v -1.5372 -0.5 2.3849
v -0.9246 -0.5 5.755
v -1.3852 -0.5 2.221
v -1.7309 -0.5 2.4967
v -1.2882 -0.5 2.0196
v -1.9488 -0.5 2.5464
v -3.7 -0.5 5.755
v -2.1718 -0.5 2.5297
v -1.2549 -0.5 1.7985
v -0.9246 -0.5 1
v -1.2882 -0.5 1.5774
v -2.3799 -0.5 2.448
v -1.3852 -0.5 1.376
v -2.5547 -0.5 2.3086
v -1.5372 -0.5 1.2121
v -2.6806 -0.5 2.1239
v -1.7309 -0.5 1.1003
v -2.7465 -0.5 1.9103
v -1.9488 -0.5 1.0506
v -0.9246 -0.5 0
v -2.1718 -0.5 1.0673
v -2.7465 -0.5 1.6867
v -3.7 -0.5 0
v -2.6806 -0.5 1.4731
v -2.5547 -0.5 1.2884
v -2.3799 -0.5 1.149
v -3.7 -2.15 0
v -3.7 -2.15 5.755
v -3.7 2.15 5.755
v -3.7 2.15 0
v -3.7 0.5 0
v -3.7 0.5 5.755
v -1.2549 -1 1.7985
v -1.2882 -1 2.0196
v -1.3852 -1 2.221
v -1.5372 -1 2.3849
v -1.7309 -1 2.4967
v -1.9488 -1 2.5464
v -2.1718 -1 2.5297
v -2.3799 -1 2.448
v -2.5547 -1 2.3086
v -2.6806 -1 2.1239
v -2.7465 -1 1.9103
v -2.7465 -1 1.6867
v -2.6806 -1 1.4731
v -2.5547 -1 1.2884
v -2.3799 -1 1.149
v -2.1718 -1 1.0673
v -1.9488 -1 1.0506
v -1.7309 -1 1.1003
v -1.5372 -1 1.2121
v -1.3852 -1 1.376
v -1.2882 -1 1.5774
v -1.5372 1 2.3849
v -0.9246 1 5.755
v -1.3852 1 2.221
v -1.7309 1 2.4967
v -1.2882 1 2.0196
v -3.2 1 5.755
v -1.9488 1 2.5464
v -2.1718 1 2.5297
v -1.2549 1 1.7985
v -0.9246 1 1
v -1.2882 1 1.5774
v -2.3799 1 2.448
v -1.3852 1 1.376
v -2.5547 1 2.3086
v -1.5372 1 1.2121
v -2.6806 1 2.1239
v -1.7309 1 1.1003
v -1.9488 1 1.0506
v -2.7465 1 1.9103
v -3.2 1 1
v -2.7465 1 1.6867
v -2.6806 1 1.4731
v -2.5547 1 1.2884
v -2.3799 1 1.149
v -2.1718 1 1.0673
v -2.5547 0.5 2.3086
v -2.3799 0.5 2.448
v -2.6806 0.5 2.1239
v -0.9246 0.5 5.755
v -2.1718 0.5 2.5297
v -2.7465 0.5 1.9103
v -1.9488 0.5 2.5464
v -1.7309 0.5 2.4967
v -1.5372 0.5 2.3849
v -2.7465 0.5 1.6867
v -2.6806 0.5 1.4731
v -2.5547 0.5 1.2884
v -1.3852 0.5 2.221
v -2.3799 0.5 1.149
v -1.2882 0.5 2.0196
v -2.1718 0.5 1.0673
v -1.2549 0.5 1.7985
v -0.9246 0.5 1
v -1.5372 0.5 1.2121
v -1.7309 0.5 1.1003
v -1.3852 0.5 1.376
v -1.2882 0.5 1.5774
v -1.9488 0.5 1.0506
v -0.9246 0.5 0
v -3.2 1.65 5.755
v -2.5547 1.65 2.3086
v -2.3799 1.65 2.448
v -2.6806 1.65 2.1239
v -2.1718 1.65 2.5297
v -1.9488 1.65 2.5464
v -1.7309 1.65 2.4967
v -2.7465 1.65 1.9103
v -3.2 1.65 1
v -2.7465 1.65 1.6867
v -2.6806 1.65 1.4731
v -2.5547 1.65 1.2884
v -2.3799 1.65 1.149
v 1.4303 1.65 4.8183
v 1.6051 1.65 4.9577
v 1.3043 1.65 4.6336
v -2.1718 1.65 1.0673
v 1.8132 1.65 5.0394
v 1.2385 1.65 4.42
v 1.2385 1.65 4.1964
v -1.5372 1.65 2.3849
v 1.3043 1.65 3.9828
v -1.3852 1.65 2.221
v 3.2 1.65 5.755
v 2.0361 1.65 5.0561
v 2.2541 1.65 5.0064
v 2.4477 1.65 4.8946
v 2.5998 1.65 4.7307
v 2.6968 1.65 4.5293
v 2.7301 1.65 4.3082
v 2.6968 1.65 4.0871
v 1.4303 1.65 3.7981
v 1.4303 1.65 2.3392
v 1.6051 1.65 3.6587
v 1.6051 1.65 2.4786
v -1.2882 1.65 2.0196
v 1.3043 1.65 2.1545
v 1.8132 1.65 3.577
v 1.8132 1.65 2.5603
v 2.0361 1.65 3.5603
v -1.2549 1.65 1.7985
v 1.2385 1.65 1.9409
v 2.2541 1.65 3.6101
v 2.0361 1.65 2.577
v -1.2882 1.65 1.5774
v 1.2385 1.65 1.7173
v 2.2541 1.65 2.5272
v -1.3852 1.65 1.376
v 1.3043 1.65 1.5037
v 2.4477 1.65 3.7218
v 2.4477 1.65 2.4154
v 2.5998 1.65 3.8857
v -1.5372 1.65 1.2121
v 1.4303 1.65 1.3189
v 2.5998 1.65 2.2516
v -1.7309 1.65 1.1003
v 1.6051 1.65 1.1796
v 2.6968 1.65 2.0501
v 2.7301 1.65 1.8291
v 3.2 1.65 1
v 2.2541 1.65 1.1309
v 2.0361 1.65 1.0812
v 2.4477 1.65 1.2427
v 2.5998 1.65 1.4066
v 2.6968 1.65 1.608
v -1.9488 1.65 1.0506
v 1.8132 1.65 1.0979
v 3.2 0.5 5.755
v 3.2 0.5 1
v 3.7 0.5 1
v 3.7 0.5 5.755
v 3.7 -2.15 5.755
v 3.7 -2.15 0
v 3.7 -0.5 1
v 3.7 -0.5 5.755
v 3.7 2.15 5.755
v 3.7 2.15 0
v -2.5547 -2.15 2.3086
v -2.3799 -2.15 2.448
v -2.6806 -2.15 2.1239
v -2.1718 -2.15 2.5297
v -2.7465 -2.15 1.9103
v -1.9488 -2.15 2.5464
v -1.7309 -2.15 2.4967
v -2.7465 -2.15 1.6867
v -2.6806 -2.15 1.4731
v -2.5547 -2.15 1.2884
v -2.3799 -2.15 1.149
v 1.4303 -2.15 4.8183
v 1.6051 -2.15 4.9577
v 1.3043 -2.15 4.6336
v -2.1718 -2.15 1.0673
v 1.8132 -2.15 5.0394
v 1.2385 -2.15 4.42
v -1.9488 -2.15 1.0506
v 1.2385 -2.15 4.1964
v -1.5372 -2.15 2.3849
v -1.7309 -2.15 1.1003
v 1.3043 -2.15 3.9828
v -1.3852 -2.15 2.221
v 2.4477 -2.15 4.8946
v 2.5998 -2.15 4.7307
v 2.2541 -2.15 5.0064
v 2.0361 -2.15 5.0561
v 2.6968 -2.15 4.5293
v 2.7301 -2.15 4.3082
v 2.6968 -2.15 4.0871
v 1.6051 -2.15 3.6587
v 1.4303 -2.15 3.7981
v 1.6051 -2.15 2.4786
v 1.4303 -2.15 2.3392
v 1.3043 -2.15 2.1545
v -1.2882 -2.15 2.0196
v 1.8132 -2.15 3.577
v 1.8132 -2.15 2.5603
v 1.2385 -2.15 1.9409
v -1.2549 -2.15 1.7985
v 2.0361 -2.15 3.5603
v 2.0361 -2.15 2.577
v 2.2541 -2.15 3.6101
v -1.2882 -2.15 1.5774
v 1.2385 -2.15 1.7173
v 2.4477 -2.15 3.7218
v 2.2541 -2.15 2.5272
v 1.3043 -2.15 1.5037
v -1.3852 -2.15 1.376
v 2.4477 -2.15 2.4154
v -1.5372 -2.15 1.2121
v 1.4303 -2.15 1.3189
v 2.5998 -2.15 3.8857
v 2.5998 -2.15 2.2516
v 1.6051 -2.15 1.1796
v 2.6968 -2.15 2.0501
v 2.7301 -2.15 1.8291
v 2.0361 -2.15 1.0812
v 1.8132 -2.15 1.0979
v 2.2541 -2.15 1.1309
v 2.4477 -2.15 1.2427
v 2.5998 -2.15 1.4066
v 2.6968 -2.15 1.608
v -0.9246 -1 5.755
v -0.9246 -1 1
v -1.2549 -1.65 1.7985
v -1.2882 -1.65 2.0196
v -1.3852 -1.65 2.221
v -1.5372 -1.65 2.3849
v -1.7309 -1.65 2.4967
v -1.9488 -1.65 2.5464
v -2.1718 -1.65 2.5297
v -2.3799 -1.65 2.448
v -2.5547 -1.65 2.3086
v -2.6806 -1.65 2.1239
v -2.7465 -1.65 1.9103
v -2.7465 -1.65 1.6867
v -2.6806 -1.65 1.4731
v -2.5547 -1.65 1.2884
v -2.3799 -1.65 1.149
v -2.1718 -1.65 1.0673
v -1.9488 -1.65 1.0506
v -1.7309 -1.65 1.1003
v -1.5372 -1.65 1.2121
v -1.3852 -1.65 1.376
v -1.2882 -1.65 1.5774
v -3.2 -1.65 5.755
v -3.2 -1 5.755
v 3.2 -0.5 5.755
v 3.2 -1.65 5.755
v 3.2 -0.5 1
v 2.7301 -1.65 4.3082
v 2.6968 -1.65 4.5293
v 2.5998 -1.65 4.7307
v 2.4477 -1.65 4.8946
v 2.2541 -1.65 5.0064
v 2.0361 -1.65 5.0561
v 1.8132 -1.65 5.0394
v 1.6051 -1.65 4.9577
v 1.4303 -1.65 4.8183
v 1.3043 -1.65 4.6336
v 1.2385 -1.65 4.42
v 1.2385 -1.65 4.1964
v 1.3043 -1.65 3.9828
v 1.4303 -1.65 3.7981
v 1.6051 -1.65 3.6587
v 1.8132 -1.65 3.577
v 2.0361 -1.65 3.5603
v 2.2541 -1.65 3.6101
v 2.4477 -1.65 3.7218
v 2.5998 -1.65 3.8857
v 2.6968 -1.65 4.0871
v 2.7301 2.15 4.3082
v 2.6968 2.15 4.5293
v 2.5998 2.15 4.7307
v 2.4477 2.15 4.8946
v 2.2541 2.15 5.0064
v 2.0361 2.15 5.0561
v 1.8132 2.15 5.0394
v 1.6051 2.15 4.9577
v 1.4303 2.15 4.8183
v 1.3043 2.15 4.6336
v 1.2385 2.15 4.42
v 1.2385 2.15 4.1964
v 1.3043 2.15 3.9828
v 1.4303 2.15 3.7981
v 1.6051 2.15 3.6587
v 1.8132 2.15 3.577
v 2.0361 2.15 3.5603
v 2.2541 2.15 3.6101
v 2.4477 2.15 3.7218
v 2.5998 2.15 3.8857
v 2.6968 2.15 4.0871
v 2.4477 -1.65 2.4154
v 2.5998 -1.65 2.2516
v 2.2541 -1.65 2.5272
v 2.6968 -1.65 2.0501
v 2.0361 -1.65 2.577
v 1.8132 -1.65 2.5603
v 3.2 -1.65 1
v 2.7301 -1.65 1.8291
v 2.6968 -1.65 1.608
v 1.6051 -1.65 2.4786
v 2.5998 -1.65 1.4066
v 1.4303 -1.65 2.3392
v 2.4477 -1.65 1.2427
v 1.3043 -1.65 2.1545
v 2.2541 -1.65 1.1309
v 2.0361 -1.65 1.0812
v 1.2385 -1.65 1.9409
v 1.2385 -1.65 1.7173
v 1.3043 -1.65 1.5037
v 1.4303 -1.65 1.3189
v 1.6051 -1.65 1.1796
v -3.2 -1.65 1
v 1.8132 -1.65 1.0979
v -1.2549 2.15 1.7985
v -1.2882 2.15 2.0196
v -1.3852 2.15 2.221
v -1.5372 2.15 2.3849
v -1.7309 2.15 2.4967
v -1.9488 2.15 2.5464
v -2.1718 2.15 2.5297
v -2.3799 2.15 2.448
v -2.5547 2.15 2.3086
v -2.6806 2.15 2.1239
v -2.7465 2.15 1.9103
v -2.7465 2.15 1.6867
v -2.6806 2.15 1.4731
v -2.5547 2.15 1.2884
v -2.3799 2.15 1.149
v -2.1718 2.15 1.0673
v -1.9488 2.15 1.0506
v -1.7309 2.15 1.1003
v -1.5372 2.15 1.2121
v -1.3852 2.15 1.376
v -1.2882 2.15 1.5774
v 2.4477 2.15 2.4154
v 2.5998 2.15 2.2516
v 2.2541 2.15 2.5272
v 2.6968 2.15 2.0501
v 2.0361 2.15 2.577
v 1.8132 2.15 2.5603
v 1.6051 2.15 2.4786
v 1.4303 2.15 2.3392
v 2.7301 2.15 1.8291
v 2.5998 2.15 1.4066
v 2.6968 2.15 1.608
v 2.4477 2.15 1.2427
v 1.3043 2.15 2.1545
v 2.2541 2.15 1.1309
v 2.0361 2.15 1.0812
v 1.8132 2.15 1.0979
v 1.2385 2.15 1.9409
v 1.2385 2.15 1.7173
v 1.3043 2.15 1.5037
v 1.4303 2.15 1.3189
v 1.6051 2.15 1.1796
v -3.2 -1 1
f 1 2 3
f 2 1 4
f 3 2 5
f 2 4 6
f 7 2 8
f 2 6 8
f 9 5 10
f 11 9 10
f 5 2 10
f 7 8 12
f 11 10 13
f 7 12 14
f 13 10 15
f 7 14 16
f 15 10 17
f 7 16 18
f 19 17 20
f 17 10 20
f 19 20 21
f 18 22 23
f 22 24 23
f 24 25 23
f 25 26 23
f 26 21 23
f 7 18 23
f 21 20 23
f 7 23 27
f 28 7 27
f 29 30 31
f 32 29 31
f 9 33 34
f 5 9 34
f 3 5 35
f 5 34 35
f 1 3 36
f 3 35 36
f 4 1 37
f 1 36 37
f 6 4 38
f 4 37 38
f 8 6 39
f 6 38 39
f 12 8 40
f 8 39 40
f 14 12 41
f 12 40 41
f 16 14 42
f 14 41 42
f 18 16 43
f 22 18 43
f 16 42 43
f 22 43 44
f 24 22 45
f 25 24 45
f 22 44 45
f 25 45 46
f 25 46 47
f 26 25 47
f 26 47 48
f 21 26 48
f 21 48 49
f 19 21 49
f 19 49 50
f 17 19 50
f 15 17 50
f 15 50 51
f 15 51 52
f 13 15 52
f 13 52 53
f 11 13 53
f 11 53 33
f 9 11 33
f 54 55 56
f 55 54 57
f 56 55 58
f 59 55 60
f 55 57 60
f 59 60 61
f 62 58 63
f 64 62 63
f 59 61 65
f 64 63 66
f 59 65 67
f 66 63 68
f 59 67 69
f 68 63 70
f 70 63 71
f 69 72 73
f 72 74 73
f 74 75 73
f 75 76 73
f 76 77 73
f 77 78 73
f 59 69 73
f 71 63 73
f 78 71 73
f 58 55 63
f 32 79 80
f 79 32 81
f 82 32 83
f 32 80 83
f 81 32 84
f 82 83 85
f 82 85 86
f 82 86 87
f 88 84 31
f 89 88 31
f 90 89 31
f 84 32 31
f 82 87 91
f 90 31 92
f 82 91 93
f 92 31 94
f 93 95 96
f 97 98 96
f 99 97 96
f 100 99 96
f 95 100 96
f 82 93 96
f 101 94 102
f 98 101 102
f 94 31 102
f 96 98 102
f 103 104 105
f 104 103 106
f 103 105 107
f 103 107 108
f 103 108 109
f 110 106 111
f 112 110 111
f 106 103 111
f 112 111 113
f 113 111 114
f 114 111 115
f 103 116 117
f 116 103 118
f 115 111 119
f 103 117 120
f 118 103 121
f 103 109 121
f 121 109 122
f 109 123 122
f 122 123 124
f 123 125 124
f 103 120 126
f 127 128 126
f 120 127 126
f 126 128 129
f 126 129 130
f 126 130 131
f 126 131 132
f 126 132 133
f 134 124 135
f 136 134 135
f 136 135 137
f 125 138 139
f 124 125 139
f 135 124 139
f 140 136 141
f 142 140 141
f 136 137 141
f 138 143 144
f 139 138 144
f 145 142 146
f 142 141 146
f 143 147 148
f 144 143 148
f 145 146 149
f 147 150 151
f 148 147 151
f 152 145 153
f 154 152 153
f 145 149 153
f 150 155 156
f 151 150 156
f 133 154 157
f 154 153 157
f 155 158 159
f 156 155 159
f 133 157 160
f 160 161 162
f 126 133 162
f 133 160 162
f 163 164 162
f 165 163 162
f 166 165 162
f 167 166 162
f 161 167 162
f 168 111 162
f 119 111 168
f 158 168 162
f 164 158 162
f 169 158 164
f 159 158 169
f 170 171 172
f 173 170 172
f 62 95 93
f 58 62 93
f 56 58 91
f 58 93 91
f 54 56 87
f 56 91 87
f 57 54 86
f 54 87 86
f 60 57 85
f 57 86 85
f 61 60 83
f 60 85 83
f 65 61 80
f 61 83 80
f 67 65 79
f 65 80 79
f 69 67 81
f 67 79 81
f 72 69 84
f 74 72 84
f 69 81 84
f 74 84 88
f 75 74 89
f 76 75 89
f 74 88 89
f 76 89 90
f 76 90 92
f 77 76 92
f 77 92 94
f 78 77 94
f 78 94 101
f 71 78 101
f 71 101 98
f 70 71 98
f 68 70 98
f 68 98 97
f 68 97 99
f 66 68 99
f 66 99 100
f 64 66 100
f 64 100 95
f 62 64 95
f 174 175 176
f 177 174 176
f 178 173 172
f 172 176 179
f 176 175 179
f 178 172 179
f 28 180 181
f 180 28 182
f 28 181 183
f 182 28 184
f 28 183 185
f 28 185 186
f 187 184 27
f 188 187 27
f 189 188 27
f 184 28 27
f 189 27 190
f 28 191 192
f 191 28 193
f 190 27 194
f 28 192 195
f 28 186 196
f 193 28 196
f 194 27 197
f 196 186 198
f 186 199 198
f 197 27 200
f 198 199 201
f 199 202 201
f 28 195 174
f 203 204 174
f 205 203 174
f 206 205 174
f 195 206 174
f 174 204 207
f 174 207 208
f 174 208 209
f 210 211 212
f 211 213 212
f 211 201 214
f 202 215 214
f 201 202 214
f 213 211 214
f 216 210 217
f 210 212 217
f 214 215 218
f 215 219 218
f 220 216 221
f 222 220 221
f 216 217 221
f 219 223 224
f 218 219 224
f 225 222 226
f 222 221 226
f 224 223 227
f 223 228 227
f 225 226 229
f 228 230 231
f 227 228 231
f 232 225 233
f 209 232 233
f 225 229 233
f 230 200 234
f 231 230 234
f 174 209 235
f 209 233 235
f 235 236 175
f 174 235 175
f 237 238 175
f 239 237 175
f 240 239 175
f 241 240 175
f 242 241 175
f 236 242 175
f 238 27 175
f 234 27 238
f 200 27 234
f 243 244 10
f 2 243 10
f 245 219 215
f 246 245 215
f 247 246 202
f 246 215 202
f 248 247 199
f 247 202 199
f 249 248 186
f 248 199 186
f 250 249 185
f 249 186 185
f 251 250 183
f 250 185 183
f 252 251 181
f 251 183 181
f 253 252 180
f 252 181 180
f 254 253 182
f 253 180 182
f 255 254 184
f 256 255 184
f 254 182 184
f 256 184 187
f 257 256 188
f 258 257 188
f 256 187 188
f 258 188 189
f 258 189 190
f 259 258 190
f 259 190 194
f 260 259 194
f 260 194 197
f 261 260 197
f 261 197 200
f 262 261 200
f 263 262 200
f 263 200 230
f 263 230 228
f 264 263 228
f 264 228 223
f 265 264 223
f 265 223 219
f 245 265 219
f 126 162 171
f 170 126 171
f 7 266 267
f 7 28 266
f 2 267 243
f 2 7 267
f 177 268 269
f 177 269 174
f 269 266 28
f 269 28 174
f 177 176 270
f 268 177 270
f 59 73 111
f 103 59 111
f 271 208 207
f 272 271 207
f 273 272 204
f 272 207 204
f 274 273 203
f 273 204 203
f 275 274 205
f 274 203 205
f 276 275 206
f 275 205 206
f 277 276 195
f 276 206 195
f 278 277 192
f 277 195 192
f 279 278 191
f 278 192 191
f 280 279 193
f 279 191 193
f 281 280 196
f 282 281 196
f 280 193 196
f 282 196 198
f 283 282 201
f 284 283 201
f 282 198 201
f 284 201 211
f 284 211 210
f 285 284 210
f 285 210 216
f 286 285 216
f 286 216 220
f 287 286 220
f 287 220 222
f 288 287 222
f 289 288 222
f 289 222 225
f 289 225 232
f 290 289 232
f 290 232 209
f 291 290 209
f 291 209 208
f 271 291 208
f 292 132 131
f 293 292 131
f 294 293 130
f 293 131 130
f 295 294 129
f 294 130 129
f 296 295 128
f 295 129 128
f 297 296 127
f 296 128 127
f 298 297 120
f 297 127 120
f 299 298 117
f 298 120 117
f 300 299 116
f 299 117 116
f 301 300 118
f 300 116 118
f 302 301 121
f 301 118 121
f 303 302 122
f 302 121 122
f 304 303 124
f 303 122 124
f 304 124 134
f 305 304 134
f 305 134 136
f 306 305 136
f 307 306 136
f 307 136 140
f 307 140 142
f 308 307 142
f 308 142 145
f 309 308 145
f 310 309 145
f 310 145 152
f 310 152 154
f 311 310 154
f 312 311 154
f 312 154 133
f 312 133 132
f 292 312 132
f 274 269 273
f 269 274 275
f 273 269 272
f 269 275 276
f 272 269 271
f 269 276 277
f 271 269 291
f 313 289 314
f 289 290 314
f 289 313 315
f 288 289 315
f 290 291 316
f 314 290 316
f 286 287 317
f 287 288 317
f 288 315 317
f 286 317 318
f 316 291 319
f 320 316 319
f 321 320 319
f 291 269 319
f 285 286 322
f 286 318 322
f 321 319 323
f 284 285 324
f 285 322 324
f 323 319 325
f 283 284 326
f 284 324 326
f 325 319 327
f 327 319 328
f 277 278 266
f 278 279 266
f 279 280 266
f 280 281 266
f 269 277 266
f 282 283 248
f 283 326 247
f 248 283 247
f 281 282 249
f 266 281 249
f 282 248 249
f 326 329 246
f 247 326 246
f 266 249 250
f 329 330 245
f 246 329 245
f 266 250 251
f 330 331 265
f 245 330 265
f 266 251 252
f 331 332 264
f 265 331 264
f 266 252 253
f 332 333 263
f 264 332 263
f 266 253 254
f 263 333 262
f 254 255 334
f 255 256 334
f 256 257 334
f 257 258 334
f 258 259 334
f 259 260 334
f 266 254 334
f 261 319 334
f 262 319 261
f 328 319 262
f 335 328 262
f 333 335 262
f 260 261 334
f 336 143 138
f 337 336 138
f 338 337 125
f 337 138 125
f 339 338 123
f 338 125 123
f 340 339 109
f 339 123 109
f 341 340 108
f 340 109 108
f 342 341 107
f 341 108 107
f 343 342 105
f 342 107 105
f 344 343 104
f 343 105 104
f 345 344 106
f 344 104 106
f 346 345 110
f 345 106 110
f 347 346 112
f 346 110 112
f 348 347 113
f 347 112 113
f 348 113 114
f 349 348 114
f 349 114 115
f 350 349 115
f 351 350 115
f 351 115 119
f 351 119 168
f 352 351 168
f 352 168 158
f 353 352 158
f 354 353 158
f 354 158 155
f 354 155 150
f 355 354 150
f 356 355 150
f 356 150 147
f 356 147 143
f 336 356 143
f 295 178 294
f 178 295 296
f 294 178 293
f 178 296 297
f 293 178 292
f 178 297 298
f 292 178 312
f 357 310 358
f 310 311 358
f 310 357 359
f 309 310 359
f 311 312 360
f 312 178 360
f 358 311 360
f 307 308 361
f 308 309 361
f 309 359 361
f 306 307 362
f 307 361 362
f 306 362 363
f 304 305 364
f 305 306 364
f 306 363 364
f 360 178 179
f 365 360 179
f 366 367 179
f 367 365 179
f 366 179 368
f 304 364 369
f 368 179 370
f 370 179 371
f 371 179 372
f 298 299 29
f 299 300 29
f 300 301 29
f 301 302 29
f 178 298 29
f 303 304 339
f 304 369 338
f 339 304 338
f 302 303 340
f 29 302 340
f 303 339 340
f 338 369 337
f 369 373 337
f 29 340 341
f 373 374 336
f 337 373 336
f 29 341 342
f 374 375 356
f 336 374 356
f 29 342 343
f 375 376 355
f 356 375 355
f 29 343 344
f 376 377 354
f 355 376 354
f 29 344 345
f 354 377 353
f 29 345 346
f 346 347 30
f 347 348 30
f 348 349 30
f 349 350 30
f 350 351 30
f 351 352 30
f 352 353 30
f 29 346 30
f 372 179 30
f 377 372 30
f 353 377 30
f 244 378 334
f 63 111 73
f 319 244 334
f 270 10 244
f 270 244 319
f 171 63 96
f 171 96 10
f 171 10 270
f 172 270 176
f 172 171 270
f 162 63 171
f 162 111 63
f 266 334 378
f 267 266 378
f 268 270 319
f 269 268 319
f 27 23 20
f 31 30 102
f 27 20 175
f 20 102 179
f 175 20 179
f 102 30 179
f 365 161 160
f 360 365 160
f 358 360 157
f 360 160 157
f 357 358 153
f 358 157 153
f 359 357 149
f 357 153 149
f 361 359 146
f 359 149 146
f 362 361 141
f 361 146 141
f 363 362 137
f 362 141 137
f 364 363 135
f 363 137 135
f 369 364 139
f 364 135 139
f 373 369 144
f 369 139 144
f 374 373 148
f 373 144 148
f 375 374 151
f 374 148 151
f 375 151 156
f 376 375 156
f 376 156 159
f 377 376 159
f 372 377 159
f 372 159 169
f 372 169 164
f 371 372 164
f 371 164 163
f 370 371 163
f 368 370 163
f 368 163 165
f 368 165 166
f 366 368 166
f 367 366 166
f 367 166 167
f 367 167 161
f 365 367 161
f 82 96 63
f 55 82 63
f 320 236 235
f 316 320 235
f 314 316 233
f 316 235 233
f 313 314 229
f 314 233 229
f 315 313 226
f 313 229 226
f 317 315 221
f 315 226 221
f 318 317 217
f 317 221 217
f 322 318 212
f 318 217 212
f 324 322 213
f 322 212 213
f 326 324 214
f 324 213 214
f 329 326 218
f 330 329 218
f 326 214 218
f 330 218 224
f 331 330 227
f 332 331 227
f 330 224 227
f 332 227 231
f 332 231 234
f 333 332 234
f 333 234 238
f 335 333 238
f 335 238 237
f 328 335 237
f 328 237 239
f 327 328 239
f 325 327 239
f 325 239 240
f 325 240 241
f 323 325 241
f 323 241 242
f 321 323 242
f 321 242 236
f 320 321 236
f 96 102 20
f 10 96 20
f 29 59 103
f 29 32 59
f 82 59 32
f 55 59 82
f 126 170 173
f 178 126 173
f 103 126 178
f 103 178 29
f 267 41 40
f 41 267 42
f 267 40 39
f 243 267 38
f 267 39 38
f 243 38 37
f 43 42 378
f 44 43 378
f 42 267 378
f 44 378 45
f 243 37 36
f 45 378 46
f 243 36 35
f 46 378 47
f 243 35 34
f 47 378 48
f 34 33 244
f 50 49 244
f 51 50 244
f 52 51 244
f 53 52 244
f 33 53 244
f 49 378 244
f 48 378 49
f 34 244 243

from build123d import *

# Parameters (mm, degrees)
F1_DEPTH = 5.755
F2_R     = 0.75
F3_DEPTH = 25
F4_DEPTH = 1


with BuildPart() as f1:
    # F0 (on Top) → F1 (new body)
    with BuildSketch(Plane.XY):
        Polygon((-3.7, -2.15), (3.7, -2.15), (3.7, -0.5), (3.2, -0.5), (3.2, -1.65), (-3.2, -1.65), (-3.2, -1), (-0.924631, -1), (-0.924631, -0.5), (-3.7, -0.5), align=None)
        Polygon((3.2, 0.5), (3.7, 0.5), (3.7, 2.15), (-3.7, 2.15), (-3.7, 0.5), (-0.924631, 0.5), (-0.924631, 1), (-3.2, 1), (-3.2, 1.65), (3.2, 1.65), align=None)
    extrude(amount=F1_DEPTH)

    # F2 (on face) → F3 (cut)
    with BuildSketch(Plane.XZ.offset(2.15)):
        with Locations((1.980075, 4.308214)):
            Circle(F2_R)
        with Locations((1.980075, 1.829074)):
            Circle(F2_R)
        with Locations((-2.004864, 1.798502)):
            Circle(F2_R)
    extrude(amount=-F3_DEPTH, mode=Mode.SUBTRACT)

    # F0 (on Top) → F4 (join)
    with BuildSketch(Plane.XY):
        Polygon((3.2, -0.5), (3.7, -0.5), (3.7, 0.5), (3.2, 0.5), (3.2, 1.65), (-3.2, 1.65), (-3.2, 1), (-0.924631, 1), (-0.924631, 0.5), (-0.924631, -0.5), (-0.924631, -1), (-3.2, -1), (-3.2, -1.65), (3.2, -1.65), align=None)
    extrude(amount=F4_DEPTH)


solid = f1.part
